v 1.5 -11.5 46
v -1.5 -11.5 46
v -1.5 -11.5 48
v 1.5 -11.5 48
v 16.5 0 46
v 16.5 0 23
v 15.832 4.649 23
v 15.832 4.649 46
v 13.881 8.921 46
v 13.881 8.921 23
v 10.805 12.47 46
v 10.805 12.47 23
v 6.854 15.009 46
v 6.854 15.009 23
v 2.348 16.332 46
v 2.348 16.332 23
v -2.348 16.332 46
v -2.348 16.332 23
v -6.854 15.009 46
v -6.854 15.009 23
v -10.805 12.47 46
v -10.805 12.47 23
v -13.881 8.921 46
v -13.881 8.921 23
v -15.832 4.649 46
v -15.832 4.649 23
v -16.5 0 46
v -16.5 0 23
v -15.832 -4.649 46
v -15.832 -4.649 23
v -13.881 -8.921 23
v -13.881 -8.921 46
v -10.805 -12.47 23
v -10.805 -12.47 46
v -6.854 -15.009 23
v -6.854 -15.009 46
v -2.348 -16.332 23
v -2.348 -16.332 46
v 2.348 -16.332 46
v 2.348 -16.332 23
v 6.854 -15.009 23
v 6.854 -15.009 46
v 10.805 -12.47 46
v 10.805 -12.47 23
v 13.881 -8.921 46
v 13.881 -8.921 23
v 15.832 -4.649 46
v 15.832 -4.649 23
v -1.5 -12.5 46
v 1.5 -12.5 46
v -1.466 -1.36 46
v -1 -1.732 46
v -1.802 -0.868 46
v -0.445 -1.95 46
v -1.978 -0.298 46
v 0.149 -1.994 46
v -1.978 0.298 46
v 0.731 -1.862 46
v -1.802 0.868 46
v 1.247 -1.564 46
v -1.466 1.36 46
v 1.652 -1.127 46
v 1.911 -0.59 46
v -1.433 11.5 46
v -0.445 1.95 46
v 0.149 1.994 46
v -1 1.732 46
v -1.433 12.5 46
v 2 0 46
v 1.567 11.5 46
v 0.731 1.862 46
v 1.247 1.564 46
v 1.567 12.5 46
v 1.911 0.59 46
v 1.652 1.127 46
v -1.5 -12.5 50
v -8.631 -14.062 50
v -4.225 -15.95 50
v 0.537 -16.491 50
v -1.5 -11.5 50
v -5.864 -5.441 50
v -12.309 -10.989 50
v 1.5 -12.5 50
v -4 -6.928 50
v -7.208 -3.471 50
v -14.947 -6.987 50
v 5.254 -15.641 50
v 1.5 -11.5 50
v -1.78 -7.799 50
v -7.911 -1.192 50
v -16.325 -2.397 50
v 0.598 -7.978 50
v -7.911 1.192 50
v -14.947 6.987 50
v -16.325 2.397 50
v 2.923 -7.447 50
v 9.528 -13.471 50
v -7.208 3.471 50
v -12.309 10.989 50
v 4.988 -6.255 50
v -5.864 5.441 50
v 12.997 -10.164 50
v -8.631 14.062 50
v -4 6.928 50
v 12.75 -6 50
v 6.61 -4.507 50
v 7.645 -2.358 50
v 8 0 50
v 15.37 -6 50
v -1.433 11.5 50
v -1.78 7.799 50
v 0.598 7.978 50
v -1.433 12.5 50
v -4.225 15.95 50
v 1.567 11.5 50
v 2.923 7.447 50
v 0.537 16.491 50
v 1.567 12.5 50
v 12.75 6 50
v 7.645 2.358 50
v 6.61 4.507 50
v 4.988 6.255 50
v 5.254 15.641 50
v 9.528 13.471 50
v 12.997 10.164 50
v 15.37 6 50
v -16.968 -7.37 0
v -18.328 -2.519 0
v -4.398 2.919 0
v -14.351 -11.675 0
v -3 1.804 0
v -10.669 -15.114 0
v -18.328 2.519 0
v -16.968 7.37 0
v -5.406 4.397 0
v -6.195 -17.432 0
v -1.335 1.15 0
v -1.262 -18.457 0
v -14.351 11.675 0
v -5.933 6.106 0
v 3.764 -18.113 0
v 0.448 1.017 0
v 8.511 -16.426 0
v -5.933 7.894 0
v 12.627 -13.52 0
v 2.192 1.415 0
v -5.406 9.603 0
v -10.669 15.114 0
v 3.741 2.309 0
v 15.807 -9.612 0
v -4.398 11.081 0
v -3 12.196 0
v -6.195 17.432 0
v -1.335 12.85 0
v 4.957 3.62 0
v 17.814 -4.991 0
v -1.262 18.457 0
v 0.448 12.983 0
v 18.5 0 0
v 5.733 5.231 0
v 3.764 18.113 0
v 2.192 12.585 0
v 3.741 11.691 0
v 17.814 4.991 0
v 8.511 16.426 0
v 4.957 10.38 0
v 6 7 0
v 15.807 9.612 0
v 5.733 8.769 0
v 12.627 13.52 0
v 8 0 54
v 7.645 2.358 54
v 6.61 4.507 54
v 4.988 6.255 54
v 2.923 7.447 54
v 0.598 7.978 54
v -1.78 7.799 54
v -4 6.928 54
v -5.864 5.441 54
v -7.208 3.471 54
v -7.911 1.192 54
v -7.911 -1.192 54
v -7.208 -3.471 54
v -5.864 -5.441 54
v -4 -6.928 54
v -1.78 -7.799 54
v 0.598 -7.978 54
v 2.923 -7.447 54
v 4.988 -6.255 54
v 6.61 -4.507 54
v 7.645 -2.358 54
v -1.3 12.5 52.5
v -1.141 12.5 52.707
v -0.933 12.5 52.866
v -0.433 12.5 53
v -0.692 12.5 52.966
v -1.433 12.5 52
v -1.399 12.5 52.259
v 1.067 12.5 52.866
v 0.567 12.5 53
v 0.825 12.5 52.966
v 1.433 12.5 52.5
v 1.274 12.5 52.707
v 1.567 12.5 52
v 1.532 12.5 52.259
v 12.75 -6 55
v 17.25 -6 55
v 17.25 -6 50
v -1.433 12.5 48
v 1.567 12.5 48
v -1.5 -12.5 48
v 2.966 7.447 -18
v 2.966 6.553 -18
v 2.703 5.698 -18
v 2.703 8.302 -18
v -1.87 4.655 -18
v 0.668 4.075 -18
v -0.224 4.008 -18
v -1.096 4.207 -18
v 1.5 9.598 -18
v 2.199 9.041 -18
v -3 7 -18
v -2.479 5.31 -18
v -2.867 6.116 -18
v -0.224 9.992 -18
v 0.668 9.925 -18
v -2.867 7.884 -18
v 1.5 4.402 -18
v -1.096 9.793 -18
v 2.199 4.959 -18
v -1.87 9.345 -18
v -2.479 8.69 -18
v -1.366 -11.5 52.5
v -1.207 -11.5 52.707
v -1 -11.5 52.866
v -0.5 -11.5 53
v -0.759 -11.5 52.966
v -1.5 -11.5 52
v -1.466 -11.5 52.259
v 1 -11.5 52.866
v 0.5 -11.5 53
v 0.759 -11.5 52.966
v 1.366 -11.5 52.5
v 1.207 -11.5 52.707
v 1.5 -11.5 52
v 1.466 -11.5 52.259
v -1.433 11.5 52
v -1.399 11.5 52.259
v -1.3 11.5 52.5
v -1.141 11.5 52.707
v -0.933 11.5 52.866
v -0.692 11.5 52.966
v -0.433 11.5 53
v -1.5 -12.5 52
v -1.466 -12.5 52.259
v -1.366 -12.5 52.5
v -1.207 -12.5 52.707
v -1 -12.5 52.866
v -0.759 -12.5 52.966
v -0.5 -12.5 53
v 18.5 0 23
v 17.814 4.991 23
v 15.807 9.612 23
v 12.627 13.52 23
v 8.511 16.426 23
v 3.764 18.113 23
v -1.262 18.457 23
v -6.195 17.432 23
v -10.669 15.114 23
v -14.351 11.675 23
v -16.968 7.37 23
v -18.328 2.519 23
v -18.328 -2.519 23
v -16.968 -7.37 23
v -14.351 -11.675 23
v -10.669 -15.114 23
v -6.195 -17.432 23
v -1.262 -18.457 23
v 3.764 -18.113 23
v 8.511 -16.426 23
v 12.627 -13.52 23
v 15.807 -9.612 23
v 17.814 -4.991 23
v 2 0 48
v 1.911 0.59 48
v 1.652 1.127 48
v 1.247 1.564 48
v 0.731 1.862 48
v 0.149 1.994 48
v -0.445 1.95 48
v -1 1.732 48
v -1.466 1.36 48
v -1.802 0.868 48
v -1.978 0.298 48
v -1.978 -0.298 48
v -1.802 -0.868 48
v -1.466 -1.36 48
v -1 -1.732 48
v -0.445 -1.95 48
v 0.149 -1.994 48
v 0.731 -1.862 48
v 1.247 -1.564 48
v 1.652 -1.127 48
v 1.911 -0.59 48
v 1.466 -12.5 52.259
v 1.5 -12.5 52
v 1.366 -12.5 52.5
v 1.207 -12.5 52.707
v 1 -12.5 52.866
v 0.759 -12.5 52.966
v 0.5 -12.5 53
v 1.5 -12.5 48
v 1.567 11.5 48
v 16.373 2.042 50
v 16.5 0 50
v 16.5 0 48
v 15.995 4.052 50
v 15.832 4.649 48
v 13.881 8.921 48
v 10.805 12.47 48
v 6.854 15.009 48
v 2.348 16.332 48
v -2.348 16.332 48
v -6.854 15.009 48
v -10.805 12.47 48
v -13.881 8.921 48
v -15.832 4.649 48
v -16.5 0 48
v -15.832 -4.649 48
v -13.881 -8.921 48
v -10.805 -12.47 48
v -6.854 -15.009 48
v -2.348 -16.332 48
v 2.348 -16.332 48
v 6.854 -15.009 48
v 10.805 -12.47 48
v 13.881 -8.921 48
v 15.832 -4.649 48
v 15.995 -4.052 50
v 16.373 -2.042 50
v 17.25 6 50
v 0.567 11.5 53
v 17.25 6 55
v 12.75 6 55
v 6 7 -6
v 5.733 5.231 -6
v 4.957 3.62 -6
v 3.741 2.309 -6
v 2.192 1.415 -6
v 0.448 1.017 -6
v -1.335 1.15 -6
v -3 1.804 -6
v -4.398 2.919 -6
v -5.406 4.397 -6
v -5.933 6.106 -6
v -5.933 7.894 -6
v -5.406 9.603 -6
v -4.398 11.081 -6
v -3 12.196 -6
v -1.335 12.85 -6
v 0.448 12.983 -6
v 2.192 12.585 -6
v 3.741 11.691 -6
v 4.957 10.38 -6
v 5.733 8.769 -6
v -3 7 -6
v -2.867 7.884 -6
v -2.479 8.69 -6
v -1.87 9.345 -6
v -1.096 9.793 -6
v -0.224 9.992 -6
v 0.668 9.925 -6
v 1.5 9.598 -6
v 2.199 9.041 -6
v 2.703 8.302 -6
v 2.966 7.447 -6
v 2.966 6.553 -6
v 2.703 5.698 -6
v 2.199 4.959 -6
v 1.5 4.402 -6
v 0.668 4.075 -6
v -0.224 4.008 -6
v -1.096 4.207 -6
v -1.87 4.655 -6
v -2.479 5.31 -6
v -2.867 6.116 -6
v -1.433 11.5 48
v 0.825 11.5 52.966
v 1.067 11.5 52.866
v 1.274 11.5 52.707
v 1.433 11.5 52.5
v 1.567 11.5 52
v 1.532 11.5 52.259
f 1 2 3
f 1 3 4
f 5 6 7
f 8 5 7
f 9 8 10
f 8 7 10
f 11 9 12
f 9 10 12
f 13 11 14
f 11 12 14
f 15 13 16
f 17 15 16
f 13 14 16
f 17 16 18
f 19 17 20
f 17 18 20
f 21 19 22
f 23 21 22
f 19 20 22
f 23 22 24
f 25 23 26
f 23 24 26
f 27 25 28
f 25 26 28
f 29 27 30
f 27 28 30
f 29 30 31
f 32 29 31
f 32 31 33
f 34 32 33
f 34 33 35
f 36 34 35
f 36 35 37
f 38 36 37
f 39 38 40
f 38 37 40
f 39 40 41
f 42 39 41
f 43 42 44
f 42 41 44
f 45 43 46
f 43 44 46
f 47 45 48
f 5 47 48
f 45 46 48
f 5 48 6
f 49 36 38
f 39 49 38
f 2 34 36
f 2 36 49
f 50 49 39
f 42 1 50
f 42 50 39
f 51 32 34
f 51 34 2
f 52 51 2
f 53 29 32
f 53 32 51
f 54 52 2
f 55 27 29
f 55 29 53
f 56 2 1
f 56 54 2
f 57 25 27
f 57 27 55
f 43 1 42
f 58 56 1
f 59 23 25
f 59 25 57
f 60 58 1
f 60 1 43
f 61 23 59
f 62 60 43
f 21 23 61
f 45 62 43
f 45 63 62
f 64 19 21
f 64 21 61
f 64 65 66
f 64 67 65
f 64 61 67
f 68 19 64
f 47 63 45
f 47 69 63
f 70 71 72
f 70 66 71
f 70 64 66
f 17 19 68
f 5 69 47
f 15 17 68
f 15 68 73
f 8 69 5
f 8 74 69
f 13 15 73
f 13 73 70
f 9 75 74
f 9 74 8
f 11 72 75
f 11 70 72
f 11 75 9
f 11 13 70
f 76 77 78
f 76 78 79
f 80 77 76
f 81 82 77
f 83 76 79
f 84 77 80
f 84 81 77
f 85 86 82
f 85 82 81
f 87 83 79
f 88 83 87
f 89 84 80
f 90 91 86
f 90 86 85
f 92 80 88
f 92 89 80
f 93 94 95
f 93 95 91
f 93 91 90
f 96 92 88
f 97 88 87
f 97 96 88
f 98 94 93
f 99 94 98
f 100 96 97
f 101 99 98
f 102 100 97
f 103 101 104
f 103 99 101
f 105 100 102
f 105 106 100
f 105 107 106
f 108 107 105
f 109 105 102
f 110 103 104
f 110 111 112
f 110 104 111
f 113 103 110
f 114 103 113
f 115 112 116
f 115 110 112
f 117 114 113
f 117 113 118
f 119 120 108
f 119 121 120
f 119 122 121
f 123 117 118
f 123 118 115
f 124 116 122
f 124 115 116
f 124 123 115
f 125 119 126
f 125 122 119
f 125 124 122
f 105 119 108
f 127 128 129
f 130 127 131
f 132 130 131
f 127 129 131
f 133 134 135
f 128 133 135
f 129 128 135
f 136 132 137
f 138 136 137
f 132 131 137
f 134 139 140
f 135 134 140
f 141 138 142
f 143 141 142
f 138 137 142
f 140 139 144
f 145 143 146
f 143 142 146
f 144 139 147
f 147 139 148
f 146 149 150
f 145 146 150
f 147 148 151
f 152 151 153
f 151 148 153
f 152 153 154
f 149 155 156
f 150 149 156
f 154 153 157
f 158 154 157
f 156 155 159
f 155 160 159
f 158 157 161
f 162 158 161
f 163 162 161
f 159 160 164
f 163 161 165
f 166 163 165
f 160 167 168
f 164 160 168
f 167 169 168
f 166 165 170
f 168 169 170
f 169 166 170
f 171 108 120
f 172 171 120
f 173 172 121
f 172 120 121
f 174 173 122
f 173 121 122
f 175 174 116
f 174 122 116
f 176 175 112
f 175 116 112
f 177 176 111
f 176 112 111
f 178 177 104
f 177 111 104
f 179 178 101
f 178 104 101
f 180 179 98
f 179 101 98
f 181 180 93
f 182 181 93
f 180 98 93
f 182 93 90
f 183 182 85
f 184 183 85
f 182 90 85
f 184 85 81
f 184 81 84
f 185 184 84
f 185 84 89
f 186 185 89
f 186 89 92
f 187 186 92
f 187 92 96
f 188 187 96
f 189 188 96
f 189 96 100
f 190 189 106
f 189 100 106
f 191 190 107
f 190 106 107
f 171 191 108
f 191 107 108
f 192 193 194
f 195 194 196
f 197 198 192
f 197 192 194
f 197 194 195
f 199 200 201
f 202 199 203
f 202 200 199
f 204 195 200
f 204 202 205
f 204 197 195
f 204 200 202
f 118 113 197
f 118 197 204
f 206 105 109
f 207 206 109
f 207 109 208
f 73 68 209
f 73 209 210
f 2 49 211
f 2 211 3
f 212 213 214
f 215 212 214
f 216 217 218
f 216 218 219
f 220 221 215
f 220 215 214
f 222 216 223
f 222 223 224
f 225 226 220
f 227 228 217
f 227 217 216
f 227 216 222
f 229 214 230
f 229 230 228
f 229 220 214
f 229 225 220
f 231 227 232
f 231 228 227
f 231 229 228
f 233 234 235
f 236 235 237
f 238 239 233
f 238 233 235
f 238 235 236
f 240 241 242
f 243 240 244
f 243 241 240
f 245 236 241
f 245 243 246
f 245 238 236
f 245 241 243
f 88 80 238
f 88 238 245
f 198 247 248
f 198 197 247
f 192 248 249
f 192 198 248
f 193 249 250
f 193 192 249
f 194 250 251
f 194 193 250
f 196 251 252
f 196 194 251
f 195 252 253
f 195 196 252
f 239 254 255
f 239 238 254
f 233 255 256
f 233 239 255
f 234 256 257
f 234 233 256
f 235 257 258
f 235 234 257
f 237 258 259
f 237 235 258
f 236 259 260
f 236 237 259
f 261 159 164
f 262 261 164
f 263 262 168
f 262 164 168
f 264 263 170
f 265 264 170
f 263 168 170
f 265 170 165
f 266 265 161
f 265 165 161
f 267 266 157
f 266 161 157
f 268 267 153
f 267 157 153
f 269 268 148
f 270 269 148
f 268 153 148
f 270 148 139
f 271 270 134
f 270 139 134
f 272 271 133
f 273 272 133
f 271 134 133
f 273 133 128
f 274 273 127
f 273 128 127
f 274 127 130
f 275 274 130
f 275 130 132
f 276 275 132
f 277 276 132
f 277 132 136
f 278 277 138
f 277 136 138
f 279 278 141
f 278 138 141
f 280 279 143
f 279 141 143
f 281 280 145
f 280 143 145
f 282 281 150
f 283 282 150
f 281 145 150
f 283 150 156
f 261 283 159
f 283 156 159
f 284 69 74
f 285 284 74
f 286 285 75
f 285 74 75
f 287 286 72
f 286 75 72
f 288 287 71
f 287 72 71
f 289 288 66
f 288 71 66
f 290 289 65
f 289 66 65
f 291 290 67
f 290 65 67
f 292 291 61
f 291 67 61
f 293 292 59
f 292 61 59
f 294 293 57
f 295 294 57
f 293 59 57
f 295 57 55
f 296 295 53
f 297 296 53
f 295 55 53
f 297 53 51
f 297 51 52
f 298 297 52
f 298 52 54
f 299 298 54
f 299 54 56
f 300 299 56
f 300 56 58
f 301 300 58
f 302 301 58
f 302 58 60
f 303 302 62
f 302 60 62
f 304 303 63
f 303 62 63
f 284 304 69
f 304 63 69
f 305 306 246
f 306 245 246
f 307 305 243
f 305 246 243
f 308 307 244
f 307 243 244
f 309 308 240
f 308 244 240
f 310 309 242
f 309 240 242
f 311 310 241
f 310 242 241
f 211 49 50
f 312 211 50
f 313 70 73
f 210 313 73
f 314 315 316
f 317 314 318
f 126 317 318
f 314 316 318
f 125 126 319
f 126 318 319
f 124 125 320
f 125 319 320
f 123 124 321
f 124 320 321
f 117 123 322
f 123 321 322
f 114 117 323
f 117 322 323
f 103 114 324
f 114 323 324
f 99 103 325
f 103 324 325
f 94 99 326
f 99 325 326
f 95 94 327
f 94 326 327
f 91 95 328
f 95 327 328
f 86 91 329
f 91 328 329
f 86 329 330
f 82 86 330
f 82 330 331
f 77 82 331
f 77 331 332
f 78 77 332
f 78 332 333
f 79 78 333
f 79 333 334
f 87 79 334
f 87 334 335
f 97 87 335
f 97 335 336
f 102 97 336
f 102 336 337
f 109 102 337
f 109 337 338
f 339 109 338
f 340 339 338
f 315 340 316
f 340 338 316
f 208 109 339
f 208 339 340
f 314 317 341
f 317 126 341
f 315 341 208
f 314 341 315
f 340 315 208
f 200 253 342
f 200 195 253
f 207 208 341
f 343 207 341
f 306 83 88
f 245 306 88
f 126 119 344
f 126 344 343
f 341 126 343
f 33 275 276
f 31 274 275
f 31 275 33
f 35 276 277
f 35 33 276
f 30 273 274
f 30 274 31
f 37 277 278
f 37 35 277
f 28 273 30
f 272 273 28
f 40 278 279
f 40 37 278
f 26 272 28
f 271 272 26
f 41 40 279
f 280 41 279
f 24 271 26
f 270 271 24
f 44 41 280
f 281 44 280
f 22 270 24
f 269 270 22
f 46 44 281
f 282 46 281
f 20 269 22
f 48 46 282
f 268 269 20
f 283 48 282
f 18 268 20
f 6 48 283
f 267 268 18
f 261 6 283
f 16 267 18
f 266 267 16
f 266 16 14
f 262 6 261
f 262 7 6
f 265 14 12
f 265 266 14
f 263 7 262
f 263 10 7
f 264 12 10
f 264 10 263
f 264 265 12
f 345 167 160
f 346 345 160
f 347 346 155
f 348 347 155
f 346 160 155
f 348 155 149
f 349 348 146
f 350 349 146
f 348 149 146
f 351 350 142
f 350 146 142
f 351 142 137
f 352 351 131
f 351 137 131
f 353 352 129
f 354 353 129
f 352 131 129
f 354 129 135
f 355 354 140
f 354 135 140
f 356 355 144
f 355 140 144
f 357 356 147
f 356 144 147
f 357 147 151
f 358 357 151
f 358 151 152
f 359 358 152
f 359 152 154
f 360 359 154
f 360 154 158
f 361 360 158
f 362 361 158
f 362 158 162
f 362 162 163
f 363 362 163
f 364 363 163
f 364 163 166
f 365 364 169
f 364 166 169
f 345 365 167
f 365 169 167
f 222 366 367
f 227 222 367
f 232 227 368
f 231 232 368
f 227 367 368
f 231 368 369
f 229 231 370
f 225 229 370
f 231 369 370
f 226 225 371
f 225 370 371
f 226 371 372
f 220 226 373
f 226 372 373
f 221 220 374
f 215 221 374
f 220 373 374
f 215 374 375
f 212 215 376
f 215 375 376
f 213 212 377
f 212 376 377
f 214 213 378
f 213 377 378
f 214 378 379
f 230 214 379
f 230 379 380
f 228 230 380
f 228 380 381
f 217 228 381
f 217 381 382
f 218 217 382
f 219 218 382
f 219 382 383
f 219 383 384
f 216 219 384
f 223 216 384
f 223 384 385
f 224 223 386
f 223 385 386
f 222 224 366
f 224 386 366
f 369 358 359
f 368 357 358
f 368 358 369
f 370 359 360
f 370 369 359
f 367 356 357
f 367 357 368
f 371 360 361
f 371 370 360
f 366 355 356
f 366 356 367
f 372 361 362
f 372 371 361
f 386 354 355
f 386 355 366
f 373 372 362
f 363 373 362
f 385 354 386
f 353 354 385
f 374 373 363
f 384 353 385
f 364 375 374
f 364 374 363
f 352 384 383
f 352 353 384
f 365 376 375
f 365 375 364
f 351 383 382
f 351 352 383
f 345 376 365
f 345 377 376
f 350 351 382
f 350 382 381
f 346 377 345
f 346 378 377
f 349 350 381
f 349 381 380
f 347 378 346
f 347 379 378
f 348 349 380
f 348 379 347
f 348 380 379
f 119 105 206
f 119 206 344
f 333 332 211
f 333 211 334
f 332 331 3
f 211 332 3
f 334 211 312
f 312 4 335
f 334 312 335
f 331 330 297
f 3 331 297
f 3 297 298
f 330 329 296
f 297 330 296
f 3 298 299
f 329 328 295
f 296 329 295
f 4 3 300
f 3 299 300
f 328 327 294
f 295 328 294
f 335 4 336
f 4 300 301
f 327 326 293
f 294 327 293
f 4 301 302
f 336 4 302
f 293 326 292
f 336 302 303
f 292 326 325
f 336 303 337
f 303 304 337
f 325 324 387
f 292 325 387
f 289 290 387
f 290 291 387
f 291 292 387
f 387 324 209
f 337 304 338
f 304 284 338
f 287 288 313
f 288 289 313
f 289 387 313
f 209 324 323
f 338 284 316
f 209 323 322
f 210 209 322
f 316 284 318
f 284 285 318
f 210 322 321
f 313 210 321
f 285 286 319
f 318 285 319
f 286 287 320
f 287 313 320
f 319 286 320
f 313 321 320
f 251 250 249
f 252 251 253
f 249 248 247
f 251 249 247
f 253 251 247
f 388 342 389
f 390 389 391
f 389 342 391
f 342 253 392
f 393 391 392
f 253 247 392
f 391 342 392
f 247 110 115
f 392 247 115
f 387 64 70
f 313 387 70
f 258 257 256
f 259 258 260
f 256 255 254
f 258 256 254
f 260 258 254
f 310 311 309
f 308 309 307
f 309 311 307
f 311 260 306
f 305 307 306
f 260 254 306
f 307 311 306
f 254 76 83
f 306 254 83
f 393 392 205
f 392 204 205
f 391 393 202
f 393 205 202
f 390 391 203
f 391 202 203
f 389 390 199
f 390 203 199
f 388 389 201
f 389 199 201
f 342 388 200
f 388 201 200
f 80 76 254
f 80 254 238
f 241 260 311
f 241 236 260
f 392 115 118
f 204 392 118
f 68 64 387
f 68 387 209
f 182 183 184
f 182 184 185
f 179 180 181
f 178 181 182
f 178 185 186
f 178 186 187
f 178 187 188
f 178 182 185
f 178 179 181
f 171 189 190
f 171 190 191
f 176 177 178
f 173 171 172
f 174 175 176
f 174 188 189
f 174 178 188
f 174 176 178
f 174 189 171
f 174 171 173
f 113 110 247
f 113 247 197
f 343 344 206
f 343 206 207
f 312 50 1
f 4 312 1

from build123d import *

# Parameters (mm, degrees)
SKETCH_1_R       = 18.5
EXTRUDE_3_DEPTH  = 23
SKETCH_3_R       = 16.5
EXTRUDE_4_DEPTH  = 23
SKETCH_4_R       = 6
EXTRUDE_5_DEPTH  = 6
SKETCH_6_R       = 3
EXTRUDE_6_DEPTH  = 12
SKETCH_7_R       = 2
EXTRUDE_7_DEPTH  = 2
SKETCH_8_W       = 3
SKETCH_8_H       = 1
EXTRUDE_8_DEPTH  = 7
SKETCH_9_R       = 16.5
EXTRUDE_9_DEPTH  = 2
SKETCH_10_W      = 4.5
SKETCH_10_H      = 12
EXTRUDE_10_DEPTH = 5
FILLET_1_R       = 1
SKETCH_11_R      = 8
EXTRUDE_11_DEPTH = 4


with BuildPart() as part:
    # 草图1 → 凸台-拉伸3 (new body)
    with BuildSketch(Plane.XY):
        Circle(SKETCH_1_R)
    extrude(amount=EXTRUDE_3_DEPTH)

    # 草图3 → 凸台-拉伸4 (add)
    with BuildSketch(Plane.XY.offset(23)):
        Circle(SKETCH_3_R)
    extrude(amount=EXTRUDE_4_DEPTH)

    # 草图4 → 凸台-拉伸5 (add)
    with BuildSketch(Plane(origin=(0, 0, 0), x_dir=(-1, 0, 0), z_dir=(0, 0, -1))):
        with Locations(Location((0, 7, 0), (0, 0, 180))):
            Circle(SKETCH_4_R)
    extrude(amount=EXTRUDE_5_DEPTH)

    # 草图6 → 凸台-拉伸6 (add)
    with BuildSketch(Plane(origin=(0, 0, -6), x_dir=(-1, 0, 0), z_dir=(0, 0, -1))):
        with Locations((0, 7)):
            Circle(SKETCH_6_R)
    extrude(amount=EXTRUDE_6_DEPTH)

    # 草图7 → 凸台-拉伸7 (add)
    with BuildSketch(Plane.XY.offset(46)):
        Circle(SKETCH_7_R)
    extrude(amount=EXTRUDE_7_DEPTH)

    # 草图8 → 凸台-拉伸8 (add)
    with BuildSketch(Plane.XY.offset(46)):
        with Locations((0, -12)):
            Rectangle(SKETCH_8_W, SKETCH_8_H)
        with Locations((0.066509227, 12)):
            Rectangle(SKETCH_8_W, SKETCH_8_H)
    extrude(amount=EXTRUDE_8_DEPTH)

    # 草图9 → 凸台-拉伸9 (add)
    with BuildSketch(Plane.XY.offset(48)):
        Circle(SKETCH_9_R)
    extrude(amount=EXTRUDE_9_DEPTH)

    # 草图10 → 凸台-拉伸10 (add)
    with BuildSketch(Plane.XY.offset(50)):
        with Locations((15, 0)):
            Rectangle(SKETCH_10_W, SKETCH_10_H)
    extrude(amount=EXTRUDE_10_DEPTH)

    # 圆角1
    fillet_1_edges = [part.edges().sort_by_distance(p)[0] for p in [
        (1.566509227, 12, 53),
        (-1.433490773, 12, 53),
        (1.5, -12, 53),
        (-1.5, -12, 53),
    ]]
    fillet(fillet_1_edges, radius=FILLET_1_R)

    # 草图11 → 凸台-拉伸11 (add)
    with BuildSketch(Plane.XY.offset(50)):
        Circle(SKETCH_11_R)
    extrude(amount=EXTRUDE_11_DEPTH)


solid = part.part
